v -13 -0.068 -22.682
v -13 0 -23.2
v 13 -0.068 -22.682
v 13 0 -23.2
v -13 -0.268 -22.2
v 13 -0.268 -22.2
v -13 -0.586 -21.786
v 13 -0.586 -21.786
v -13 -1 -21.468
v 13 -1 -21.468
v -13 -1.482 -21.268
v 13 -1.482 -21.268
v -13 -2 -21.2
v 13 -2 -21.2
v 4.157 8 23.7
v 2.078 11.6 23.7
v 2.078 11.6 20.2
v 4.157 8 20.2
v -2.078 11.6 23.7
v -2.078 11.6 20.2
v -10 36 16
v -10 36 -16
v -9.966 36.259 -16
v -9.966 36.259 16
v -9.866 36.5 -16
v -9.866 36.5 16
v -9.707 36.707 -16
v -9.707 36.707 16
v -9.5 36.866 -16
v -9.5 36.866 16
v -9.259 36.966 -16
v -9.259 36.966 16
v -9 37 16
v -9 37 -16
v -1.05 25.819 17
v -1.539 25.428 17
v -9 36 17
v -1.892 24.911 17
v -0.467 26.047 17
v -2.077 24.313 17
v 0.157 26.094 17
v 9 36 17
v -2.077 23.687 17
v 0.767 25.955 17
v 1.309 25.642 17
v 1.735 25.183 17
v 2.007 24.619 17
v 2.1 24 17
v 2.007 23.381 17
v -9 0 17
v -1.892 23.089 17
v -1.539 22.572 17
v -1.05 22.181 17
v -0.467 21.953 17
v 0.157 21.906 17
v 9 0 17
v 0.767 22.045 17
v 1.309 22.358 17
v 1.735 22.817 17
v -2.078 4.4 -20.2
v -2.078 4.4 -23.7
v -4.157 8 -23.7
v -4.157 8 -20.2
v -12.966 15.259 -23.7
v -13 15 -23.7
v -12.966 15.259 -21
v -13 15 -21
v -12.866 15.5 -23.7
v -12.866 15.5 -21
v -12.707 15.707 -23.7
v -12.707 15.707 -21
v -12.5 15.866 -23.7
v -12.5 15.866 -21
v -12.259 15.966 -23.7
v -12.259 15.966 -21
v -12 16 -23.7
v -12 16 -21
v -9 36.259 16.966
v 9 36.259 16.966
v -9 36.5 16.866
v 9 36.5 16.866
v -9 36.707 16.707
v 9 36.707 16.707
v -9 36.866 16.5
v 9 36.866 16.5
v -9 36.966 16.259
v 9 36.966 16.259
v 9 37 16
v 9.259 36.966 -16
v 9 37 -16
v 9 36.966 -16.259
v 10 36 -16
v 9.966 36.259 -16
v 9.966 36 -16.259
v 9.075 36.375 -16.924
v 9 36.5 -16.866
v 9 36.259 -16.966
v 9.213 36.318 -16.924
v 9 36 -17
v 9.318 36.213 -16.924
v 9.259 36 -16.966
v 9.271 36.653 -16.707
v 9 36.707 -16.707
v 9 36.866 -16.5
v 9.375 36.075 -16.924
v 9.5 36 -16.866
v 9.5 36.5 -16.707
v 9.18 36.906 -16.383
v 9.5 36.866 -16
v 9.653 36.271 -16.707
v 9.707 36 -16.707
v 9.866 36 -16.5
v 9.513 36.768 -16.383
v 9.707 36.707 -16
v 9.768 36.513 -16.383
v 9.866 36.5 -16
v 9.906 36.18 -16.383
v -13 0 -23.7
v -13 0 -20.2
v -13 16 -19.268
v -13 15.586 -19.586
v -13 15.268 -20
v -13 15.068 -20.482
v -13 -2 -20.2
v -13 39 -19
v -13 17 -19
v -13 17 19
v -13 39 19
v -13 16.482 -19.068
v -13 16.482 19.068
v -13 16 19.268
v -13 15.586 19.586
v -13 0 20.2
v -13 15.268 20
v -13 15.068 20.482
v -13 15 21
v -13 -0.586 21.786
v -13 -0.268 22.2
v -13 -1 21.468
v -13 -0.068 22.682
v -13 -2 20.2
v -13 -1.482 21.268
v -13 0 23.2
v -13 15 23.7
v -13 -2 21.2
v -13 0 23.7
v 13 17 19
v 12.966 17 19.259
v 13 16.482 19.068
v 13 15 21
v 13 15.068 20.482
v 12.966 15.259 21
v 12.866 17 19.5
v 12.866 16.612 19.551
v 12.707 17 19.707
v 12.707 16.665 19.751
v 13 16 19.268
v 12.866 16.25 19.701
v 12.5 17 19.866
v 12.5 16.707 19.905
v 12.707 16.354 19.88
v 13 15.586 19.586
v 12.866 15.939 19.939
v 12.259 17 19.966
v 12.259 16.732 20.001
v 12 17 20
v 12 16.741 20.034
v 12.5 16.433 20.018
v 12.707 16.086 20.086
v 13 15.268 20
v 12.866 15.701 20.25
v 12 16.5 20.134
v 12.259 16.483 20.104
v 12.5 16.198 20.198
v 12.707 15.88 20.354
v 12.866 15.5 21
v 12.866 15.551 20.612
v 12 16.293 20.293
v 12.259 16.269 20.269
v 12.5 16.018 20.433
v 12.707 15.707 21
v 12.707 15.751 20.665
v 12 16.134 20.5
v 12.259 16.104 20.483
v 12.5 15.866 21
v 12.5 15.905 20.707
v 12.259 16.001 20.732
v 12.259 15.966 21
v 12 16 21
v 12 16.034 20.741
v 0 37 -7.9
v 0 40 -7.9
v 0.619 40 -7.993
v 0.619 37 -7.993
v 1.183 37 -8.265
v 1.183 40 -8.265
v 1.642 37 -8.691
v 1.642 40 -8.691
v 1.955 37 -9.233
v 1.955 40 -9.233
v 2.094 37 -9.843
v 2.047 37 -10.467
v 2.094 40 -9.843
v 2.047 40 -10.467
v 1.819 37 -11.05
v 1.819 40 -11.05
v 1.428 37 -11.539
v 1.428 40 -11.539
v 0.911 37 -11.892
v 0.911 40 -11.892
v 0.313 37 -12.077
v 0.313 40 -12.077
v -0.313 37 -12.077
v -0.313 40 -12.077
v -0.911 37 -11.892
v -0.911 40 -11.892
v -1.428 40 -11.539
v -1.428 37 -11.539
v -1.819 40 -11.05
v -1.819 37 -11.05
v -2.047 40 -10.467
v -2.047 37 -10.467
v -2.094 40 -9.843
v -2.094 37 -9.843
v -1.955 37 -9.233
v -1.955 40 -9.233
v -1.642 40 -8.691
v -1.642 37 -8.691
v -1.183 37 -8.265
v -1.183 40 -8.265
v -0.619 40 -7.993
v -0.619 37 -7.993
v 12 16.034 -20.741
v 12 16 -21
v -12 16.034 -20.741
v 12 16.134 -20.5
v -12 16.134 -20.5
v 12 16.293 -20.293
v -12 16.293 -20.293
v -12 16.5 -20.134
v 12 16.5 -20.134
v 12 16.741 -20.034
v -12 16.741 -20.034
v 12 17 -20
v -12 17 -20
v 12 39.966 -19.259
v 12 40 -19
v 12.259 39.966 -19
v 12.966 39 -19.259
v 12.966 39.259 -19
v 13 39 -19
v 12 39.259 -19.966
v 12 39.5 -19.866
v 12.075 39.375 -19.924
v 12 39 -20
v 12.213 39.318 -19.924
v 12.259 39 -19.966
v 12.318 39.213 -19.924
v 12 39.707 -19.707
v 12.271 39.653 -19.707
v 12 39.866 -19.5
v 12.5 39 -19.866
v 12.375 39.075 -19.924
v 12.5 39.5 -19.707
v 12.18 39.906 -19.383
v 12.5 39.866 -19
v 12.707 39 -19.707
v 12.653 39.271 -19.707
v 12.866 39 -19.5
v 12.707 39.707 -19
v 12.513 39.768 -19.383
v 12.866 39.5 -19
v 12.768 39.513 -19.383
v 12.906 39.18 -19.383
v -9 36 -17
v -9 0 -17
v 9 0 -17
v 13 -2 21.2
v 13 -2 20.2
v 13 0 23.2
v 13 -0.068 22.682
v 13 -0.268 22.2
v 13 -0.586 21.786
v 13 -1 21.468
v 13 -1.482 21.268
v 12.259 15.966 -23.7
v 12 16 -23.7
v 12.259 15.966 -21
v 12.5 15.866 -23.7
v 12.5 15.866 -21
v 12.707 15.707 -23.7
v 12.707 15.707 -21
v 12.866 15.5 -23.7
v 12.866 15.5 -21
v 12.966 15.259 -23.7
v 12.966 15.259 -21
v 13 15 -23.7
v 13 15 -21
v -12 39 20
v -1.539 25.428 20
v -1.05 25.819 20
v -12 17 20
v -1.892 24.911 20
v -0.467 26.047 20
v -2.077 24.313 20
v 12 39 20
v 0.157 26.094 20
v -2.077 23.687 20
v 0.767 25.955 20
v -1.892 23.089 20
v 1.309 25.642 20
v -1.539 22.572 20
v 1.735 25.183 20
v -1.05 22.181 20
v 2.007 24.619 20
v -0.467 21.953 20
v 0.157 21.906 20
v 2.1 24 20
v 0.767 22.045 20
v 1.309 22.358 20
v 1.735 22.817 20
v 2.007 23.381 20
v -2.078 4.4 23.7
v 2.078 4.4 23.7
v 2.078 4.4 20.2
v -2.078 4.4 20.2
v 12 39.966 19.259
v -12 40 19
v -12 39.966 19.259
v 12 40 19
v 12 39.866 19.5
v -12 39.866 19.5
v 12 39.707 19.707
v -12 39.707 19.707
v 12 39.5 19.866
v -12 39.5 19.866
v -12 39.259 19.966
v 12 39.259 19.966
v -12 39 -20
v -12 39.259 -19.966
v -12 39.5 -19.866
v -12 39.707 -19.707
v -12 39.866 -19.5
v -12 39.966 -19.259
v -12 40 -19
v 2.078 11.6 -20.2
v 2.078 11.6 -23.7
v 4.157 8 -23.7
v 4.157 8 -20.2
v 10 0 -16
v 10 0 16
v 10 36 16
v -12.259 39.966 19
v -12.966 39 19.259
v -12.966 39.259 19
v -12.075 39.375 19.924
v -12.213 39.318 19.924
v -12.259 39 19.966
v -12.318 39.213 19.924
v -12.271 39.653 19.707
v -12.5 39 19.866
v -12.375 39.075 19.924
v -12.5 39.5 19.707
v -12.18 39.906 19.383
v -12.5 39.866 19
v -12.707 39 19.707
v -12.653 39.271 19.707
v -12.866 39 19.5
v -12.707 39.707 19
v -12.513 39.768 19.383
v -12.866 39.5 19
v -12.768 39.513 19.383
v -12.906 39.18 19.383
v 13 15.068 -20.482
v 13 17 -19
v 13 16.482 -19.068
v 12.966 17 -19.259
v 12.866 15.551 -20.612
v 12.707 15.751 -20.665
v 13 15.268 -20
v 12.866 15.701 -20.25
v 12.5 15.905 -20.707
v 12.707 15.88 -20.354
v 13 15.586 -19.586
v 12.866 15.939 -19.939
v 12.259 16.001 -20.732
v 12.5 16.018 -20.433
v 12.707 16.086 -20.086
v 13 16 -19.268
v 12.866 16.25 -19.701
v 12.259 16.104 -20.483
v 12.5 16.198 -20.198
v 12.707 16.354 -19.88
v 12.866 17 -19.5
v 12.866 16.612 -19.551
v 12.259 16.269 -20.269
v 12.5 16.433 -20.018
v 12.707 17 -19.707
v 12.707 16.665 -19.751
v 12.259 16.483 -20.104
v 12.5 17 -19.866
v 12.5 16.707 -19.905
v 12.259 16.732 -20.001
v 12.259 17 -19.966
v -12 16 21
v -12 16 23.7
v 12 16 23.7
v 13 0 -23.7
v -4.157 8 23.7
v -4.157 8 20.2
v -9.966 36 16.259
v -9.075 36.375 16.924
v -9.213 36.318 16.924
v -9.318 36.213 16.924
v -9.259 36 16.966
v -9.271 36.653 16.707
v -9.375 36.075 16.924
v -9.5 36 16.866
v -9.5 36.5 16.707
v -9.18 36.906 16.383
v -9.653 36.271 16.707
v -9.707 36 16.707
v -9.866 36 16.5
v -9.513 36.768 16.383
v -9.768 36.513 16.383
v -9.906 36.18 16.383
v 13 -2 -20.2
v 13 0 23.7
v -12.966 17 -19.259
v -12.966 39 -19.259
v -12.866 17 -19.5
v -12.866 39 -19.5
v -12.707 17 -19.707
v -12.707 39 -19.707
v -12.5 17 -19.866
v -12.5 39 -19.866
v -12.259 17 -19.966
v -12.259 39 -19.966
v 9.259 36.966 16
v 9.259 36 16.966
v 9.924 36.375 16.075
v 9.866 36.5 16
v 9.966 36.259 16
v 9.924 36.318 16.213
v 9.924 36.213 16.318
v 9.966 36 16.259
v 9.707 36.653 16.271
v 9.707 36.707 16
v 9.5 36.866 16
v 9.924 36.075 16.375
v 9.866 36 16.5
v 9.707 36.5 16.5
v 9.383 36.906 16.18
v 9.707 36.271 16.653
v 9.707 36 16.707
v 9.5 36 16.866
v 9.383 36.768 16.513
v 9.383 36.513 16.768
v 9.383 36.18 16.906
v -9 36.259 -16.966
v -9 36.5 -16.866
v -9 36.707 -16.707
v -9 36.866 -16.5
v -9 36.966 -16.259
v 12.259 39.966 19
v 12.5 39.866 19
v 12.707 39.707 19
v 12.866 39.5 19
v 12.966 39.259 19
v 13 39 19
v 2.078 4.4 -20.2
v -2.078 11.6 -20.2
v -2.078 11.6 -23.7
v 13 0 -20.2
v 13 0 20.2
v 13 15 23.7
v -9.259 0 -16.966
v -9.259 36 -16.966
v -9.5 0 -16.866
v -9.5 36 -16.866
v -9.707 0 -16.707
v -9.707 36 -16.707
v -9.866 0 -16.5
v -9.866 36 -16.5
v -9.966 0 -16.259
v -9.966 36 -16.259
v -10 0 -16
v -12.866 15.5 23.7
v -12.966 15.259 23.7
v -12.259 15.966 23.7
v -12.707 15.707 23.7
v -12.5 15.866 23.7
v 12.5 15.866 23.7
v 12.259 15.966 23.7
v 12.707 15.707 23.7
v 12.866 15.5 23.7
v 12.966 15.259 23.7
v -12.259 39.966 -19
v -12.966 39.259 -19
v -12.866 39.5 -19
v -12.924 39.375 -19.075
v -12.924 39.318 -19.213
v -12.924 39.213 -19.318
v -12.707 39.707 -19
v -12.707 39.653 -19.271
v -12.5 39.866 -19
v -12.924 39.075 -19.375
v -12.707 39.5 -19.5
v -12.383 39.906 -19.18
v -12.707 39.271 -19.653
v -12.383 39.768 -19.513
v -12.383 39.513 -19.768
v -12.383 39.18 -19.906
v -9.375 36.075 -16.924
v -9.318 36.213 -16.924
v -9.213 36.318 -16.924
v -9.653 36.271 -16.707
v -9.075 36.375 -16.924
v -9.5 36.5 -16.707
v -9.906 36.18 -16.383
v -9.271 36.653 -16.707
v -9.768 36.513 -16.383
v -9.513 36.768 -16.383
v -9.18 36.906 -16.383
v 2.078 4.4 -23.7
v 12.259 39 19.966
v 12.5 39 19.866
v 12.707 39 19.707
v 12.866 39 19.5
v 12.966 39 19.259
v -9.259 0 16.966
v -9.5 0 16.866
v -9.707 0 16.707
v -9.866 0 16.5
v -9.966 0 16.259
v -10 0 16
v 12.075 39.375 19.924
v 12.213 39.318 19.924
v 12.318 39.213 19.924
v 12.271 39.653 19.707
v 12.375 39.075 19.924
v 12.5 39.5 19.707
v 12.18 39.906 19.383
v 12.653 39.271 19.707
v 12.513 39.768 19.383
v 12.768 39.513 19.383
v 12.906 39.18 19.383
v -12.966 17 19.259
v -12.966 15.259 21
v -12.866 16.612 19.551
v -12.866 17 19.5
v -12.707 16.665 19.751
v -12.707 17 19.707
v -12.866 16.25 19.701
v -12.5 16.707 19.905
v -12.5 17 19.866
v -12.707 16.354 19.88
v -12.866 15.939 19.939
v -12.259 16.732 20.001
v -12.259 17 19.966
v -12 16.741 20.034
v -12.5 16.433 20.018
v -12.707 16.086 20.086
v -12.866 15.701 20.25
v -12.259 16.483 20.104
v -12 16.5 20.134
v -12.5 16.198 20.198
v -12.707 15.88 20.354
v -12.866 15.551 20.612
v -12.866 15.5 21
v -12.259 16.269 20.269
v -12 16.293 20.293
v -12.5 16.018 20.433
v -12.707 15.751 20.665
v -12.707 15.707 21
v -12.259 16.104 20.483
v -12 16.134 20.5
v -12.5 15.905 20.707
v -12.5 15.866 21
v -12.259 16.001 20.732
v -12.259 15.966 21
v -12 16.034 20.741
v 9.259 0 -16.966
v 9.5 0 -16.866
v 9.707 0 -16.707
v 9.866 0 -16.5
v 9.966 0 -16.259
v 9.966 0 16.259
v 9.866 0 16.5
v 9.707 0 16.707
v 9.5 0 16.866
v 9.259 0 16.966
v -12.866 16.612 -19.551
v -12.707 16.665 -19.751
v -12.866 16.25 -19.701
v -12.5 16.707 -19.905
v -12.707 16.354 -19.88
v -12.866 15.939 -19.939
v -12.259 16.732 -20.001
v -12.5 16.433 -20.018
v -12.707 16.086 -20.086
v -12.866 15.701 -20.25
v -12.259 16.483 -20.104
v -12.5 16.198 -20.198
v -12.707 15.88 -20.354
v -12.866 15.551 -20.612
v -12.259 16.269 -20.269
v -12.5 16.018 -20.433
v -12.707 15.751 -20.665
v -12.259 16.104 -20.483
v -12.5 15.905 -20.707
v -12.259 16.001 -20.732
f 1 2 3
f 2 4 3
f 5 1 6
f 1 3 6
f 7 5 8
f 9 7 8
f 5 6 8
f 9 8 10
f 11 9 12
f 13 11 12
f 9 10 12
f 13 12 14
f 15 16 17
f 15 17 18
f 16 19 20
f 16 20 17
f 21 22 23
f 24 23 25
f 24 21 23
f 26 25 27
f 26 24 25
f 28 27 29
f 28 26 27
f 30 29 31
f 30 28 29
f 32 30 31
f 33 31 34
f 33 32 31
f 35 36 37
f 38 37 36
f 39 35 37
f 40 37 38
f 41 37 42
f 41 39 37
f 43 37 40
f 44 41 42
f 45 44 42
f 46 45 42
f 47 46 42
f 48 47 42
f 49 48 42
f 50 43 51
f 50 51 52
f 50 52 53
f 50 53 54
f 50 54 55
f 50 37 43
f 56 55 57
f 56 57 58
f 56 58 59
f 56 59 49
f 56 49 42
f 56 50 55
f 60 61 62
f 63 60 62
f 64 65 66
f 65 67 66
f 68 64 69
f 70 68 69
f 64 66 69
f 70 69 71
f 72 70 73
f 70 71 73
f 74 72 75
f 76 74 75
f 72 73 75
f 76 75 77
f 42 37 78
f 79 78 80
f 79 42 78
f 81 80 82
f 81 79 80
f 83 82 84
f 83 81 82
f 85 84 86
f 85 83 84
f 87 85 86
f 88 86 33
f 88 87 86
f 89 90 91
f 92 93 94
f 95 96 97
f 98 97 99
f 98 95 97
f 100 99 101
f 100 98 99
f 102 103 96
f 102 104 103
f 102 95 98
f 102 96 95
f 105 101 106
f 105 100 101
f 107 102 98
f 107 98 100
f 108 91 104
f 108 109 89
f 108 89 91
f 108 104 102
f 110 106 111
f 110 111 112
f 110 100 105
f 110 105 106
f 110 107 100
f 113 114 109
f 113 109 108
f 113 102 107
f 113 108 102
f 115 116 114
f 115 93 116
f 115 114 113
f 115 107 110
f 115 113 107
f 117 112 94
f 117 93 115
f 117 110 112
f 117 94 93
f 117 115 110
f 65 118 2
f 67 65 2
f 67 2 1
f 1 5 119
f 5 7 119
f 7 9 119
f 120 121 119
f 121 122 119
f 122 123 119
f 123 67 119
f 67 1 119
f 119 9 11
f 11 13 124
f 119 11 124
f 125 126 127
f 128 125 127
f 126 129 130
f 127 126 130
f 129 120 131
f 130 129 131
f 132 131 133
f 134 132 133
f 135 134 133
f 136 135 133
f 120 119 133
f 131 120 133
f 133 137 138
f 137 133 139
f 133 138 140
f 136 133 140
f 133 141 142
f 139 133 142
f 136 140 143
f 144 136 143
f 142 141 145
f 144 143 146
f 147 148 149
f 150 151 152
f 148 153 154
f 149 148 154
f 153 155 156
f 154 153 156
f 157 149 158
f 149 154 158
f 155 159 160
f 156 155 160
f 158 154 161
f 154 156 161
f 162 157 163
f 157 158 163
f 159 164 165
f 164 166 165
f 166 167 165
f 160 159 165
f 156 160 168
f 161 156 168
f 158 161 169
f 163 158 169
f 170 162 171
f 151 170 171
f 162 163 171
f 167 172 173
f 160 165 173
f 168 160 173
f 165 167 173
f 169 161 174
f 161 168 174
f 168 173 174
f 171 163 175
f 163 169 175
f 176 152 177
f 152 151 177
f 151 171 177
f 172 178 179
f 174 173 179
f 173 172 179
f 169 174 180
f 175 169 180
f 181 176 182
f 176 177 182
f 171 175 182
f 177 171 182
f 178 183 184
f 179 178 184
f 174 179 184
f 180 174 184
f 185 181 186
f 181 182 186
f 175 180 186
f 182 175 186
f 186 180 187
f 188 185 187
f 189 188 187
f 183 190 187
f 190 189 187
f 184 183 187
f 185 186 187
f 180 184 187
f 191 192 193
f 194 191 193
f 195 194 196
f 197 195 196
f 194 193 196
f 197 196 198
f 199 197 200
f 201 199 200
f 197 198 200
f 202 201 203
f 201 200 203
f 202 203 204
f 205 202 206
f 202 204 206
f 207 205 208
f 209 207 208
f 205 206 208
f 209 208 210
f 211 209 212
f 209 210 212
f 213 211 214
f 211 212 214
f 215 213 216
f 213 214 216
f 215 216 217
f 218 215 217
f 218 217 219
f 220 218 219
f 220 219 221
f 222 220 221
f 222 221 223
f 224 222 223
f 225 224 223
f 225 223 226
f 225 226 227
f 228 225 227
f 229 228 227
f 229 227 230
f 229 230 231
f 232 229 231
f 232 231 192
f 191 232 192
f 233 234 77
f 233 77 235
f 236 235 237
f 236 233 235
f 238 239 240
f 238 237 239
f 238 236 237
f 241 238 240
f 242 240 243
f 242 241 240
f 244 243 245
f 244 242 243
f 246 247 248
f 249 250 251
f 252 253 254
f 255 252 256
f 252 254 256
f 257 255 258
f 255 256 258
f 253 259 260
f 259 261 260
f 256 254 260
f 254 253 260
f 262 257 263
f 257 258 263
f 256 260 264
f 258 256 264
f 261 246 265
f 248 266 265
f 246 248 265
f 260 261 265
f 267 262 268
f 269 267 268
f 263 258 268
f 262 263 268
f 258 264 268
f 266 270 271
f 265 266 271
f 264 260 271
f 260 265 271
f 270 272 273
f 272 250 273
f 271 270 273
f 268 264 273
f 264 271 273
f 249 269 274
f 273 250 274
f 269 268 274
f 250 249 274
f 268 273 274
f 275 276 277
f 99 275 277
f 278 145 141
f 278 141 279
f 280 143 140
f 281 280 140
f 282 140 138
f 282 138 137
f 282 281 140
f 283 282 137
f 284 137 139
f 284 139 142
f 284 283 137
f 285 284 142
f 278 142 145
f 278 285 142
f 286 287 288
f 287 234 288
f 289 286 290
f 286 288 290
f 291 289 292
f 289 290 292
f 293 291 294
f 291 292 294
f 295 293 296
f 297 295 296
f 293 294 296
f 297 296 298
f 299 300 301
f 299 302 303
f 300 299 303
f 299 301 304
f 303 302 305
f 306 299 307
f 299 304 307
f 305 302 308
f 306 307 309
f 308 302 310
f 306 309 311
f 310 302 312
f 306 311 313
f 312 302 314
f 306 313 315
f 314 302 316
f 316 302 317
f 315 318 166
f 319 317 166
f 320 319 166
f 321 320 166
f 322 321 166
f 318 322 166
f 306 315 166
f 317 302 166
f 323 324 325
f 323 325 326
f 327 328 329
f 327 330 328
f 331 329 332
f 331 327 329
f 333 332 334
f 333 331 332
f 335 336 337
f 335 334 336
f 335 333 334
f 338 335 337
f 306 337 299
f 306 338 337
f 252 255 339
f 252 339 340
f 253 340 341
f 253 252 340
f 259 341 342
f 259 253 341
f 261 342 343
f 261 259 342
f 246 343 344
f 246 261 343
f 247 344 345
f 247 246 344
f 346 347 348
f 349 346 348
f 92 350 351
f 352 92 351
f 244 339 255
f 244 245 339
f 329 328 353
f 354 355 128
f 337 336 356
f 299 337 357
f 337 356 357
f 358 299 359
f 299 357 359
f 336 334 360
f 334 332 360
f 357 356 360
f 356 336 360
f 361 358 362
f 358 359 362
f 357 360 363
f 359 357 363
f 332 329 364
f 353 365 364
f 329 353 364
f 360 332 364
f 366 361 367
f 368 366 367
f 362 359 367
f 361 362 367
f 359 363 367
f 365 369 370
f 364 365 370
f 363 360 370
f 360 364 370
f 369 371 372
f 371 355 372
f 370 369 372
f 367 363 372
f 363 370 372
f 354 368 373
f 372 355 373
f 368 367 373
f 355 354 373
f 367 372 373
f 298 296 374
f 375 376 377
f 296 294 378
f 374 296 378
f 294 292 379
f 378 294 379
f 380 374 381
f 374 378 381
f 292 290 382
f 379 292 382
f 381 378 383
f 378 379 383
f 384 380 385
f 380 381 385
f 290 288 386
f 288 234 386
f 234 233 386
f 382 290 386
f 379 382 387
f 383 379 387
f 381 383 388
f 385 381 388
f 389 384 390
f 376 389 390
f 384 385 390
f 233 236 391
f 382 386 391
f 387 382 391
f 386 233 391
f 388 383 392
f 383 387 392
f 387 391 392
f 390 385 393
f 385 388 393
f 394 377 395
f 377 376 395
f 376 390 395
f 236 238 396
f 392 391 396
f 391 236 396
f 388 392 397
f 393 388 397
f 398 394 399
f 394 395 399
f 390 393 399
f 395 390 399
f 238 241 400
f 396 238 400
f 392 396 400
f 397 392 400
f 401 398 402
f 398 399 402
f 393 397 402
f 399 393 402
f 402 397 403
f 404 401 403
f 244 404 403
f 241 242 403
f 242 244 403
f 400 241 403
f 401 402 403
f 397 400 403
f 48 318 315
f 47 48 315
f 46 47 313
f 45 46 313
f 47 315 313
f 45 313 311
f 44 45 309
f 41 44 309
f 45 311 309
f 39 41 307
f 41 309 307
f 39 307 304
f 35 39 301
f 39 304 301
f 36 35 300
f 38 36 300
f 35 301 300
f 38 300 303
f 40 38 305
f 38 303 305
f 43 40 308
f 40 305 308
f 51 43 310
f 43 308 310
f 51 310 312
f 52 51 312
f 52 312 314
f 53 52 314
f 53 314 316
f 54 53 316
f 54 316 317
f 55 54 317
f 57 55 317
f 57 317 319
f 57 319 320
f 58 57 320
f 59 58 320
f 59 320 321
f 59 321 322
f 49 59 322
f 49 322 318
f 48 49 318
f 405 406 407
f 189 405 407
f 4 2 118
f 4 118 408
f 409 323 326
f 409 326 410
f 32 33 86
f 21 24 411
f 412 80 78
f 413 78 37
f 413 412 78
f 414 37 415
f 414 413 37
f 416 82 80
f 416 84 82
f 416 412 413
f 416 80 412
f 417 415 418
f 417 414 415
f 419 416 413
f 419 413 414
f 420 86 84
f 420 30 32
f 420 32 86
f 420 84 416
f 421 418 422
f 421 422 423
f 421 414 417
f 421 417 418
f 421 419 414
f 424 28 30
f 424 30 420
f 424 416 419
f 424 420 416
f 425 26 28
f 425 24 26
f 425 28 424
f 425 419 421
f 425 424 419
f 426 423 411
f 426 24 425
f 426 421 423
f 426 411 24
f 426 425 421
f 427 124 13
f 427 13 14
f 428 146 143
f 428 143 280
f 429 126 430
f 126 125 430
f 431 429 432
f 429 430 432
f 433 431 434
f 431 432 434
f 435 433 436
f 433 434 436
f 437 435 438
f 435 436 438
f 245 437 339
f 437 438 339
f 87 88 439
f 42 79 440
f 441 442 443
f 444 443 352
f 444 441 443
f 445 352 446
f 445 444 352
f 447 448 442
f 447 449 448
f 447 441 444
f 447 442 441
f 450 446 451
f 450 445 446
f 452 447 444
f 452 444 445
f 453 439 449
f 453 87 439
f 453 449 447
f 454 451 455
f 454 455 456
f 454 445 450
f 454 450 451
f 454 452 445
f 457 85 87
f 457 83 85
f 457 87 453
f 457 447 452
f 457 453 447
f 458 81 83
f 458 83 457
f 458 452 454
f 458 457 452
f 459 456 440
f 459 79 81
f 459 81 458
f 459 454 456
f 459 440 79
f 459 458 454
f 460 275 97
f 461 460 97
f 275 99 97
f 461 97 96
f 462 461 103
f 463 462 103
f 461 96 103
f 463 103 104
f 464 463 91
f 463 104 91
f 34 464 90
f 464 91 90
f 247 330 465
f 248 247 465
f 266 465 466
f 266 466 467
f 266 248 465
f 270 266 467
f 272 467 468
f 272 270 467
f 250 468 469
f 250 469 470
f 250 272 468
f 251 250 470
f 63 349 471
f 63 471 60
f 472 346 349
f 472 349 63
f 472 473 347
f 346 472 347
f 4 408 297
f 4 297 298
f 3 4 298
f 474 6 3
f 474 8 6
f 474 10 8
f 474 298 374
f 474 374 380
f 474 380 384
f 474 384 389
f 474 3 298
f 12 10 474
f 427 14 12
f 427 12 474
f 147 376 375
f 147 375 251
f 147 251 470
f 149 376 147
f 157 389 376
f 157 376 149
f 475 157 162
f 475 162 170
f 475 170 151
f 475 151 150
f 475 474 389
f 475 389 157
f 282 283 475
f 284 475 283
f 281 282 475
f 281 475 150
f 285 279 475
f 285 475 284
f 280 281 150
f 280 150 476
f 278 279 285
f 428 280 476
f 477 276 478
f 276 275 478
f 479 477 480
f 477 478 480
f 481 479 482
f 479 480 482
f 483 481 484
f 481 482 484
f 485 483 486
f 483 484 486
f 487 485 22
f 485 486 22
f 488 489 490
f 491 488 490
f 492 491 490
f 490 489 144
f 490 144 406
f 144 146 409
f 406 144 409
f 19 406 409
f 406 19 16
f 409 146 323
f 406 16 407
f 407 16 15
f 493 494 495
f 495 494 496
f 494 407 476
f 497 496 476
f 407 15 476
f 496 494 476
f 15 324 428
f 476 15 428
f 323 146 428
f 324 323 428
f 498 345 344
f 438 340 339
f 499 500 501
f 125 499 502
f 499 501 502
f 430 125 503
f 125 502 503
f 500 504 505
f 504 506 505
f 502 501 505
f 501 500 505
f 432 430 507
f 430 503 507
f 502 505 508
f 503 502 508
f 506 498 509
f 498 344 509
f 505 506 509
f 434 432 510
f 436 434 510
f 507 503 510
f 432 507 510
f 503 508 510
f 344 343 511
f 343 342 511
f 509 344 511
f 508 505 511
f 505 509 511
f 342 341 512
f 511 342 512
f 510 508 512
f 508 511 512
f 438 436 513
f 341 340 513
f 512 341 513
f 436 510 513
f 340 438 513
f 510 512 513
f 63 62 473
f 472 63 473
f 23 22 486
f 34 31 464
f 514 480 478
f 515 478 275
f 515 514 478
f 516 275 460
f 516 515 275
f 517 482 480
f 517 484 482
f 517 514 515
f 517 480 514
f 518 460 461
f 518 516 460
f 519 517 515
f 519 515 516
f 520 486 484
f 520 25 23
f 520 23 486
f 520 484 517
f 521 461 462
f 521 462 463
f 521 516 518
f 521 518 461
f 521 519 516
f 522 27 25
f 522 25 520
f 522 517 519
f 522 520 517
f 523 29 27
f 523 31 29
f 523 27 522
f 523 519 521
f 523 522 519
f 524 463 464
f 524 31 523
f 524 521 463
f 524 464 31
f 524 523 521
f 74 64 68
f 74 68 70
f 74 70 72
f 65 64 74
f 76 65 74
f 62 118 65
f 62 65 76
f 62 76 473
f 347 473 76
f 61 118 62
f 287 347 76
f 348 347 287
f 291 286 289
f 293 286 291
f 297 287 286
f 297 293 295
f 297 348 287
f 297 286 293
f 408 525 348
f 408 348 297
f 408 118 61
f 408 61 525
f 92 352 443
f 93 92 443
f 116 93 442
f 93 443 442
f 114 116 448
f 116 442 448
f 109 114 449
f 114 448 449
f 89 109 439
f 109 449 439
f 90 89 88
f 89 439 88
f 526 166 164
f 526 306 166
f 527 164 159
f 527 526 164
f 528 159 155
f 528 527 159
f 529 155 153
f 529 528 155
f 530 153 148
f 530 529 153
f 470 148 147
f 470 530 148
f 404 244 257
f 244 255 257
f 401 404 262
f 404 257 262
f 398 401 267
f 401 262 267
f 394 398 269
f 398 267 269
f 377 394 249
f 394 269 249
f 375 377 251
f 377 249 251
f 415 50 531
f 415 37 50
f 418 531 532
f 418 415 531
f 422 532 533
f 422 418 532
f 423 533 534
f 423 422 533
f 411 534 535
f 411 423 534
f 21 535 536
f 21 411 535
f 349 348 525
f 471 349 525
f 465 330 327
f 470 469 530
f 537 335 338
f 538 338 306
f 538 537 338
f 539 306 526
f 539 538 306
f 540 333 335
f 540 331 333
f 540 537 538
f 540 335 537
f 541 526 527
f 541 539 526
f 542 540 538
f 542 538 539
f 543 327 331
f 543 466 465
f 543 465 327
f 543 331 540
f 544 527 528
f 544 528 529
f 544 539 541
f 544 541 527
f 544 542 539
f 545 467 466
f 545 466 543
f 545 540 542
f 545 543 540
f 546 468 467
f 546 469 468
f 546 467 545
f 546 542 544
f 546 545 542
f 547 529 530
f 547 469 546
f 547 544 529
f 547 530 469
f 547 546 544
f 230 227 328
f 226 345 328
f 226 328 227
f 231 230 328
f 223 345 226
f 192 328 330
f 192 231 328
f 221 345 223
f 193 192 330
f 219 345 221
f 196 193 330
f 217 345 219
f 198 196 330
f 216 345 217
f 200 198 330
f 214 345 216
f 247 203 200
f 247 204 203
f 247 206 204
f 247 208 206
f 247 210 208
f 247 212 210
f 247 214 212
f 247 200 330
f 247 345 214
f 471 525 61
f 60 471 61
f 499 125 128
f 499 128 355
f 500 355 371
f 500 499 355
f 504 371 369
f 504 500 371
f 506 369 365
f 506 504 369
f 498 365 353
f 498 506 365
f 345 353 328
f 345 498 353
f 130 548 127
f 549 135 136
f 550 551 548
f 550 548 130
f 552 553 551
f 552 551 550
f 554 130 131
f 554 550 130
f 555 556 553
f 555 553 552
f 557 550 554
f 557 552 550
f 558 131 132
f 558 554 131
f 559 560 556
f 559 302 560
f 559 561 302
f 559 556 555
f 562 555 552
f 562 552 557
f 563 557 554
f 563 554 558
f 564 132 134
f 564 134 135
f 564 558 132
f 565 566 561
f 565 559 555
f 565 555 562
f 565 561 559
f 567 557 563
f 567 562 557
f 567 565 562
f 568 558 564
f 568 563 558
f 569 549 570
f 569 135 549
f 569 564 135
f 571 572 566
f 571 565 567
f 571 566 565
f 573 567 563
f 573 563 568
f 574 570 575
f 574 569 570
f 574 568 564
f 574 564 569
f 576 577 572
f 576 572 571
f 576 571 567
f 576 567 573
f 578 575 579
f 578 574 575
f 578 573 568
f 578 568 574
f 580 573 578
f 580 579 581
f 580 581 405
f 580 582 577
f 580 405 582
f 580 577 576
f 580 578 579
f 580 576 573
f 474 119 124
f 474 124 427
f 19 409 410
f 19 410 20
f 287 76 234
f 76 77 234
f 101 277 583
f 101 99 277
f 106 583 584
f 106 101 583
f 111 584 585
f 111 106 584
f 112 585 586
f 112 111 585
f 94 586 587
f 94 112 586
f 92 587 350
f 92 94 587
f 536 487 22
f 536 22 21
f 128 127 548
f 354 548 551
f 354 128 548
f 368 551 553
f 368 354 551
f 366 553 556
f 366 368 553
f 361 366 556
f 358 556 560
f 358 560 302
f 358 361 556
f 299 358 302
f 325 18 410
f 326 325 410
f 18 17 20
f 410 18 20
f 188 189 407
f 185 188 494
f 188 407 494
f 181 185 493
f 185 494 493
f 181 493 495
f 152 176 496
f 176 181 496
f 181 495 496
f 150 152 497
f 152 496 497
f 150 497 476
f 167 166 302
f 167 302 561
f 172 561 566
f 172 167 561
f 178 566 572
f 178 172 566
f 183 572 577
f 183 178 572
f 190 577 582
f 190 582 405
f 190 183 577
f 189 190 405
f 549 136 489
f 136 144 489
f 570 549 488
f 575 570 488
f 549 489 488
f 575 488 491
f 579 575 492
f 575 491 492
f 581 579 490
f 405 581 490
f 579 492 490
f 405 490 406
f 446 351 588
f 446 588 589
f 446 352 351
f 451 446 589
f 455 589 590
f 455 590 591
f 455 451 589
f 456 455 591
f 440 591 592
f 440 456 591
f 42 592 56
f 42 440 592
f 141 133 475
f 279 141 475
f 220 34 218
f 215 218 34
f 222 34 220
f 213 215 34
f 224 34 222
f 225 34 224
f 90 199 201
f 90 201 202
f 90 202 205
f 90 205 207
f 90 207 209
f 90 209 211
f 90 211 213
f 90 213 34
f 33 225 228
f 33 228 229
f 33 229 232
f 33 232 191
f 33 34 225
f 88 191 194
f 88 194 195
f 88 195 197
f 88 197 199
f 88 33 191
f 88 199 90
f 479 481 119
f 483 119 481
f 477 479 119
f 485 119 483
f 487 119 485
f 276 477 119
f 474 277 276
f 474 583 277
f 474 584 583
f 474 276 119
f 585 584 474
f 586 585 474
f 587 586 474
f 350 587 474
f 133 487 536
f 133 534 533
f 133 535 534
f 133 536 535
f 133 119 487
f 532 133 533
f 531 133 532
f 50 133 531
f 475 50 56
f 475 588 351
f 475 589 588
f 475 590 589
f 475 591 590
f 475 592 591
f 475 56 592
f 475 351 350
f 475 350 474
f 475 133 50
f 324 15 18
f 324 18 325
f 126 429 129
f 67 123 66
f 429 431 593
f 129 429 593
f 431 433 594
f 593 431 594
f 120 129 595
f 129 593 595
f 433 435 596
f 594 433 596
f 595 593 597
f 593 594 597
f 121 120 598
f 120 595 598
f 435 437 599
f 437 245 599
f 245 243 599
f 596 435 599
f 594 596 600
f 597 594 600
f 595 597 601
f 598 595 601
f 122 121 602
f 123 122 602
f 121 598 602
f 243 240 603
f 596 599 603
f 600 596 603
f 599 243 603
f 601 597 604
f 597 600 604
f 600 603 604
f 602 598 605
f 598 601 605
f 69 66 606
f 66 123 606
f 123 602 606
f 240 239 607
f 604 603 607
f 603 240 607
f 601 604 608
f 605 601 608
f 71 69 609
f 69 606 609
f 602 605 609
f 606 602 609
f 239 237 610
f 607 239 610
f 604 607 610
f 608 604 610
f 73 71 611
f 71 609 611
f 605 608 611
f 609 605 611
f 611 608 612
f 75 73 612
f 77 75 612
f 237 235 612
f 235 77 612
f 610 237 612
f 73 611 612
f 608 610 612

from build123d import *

# Parameters (mm, degrees)
SKETCH1_W           = 26
SKETCH1_H           = 40
BOSS_EXTRUDE1_DEPTH = 40
SKETCH2_W           = 26
SKETCH2_H           = 3.7
BOSS_EXTRUDE2_DEPTH = 16
SKETCH5_W           = 20
SKETCH5_H           = 34
CUT_EXTRUDE3_DEPTH  = 37
FILLET1_R           = 1
FILLET2_R           = 1
CUT_EXTRUDE6_DEPTH  = 3.5
SKETCH9_W           = 26
SKETCH9_H           = 1
BOSS_EXTRUDE3_DEPTH = 2
CUT_EXTRUDE7_REACH  = 62.652
SKETCH12_R          = 2.1
CUT_EXTRUDE8_REACH  = 51.947
SKETCH13_R          = 2.1
FILLET3_R           = 2


with BuildPart() as part:
    # Sketch1 → Boss-Extrude1 (new body)
    with BuildSketch(Plane(origin=(0, 0, 0), x_dir=(1, 0, 0), z_dir=(0, 1, 0))):
        Rectangle(SKETCH1_W, SKETCH1_H)
    extrude(amount=BOSS_EXTRUDE1_DEPTH)

    # Sketch2 → Boss-Extrude2 (add)
    with BuildSketch(Plane.XZ):
        with Locations((0, 21.85)):
            Rectangle(SKETCH2_W, SKETCH2_H)
        with Locations((0, -21.85)):
            Rectangle(SKETCH2_W, SKETCH2_H)
    extrude(amount=-BOSS_EXTRUDE2_DEPTH)

    # Sketch5 → Cut-Extrude3 (cut)
    with BuildSketch(Plane.XZ):
        Rectangle(SKETCH5_W, SKETCH5_H)
    extrude(amount=-CUT_EXTRUDE3_DEPTH, mode=Mode.SUBTRACT)

    # Fillet1
    fillet1_edges = [part.edges().sort_by_distance(p)[0] for p in [
        (13, 40, 0),
        (0, 40, -20),
        (-13, 16, 21.85),
        (13, 16, 21.85),
        (0, 16, 20),
        (-13, 16, -21.85),
        (0, 16, -20),
        (13, 16, -21.85),
        (-13, 40, 0),
        (0, 40, 20),
        (-13, 28, -20),
        (13, 28, -20),
        (13, 28, 20),
        (-13, 28, 20),
    ]]
    fillet(fillet1_edges, radius=FILLET1_R)

    # Fillet2
    fillet2_edges = [part.edges().sort_by_distance(p)[0] for p in [
        (-10, 37, 0),
        (-10, 18.5, -17),
        (0, 37, 17),
        (-10, 18.5, 17),
        (10, 37, 0),
        (10, 18.5, 17),
        (0, 37, -17),
        (10, 18.5, -17),
    ]]
    fillet(fillet2_edges, radius=FILLET2_R)

    # Sketch3 → Cut-Extrude6 (cut)
    with BuildSketch(Plane(origin=(0, 0, -23.7), x_dir=(-1, 0, 0), z_dir=(0, 0, -1))):
        Polygon((2.078460969, 11.6), (-2.078460969, 11.6), (-4.156921938, 8), (-2.078460969, 4.4), (2.078460969, 4.4), (4.156921938, 8), align=None)
    cut_extrude6 = extrude(amount=-CUT_EXTRUDE6_DEPTH, mode=Mode.SUBTRACT)

    # Mirror2: Cut-Extrude6 across plane
    add(cut_extrude6.mirror(Plane.XY), mode=Mode.SUBTRACT)

    # Sketch9 → Boss-Extrude3 (add)
    with BuildSketch(Plane.XZ):
        with Locations((0, 20.7)):
            Rectangle(SKETCH9_W, SKETCH9_H)
        with Locations((0, -20.7)):
            Rectangle(SKETCH9_W, SKETCH9_H)
    extrude(amount=BOSS_EXTRUDE3_DEPTH)

    # Sketch12 → Cut-Extrude7 (cut, up to next)
    with BuildSketch(Plane.XY.offset(20), mode=Mode.PRIVATE) as cut_extrude7_sk1:
        with Locations((0, 24)):
            Circle(SKETCH12_R)
    cut_extrude7_tool1 = extrude(cut_extrude7_sk1.sketch, amount=-CUT_EXTRUDE7_REACH, mode=Mode.PRIVATE) & part.part
    add(cut_extrude7_tool1.solids().sort_by_distance((0, 24, 20))[0], mode=Mode.SUBTRACT)

    # Sketch13 → Cut-Extrude8 (cut, up to next)
    with BuildSketch(Plane(origin=(0, 40, 0), x_dir=(1, 0, 0), z_dir=(0, 1, 0)), mode=Mode.PRIVATE) as cut_extrude8_sk1:
        with Locations(Location((0, 10, 0), (0, 0, 270))):
            Circle(SKETCH13_R)
    cut_extrude8_tool1 = extrude(cut_extrude8_sk1.sketch, amount=-CUT_EXTRUDE8_REACH, mode=Mode.PRIVATE) & part.part
    add(cut_extrude8_tool1.solids().sort_by_distance((0, 40, -10))[0], mode=Mode.SUBTRACT)

    # Fillet3
    fillet3_edges = [part.edges().sort_by_distance(p)[0] for p in [
        (0, 0, 21.2),
        (0, 0, -21.2),
    ]]
    fillet(fillet3_edges, radius=FILLET3_R - 0.0001)  # a hair under: the kernel refuses the full size


solid = part.part
